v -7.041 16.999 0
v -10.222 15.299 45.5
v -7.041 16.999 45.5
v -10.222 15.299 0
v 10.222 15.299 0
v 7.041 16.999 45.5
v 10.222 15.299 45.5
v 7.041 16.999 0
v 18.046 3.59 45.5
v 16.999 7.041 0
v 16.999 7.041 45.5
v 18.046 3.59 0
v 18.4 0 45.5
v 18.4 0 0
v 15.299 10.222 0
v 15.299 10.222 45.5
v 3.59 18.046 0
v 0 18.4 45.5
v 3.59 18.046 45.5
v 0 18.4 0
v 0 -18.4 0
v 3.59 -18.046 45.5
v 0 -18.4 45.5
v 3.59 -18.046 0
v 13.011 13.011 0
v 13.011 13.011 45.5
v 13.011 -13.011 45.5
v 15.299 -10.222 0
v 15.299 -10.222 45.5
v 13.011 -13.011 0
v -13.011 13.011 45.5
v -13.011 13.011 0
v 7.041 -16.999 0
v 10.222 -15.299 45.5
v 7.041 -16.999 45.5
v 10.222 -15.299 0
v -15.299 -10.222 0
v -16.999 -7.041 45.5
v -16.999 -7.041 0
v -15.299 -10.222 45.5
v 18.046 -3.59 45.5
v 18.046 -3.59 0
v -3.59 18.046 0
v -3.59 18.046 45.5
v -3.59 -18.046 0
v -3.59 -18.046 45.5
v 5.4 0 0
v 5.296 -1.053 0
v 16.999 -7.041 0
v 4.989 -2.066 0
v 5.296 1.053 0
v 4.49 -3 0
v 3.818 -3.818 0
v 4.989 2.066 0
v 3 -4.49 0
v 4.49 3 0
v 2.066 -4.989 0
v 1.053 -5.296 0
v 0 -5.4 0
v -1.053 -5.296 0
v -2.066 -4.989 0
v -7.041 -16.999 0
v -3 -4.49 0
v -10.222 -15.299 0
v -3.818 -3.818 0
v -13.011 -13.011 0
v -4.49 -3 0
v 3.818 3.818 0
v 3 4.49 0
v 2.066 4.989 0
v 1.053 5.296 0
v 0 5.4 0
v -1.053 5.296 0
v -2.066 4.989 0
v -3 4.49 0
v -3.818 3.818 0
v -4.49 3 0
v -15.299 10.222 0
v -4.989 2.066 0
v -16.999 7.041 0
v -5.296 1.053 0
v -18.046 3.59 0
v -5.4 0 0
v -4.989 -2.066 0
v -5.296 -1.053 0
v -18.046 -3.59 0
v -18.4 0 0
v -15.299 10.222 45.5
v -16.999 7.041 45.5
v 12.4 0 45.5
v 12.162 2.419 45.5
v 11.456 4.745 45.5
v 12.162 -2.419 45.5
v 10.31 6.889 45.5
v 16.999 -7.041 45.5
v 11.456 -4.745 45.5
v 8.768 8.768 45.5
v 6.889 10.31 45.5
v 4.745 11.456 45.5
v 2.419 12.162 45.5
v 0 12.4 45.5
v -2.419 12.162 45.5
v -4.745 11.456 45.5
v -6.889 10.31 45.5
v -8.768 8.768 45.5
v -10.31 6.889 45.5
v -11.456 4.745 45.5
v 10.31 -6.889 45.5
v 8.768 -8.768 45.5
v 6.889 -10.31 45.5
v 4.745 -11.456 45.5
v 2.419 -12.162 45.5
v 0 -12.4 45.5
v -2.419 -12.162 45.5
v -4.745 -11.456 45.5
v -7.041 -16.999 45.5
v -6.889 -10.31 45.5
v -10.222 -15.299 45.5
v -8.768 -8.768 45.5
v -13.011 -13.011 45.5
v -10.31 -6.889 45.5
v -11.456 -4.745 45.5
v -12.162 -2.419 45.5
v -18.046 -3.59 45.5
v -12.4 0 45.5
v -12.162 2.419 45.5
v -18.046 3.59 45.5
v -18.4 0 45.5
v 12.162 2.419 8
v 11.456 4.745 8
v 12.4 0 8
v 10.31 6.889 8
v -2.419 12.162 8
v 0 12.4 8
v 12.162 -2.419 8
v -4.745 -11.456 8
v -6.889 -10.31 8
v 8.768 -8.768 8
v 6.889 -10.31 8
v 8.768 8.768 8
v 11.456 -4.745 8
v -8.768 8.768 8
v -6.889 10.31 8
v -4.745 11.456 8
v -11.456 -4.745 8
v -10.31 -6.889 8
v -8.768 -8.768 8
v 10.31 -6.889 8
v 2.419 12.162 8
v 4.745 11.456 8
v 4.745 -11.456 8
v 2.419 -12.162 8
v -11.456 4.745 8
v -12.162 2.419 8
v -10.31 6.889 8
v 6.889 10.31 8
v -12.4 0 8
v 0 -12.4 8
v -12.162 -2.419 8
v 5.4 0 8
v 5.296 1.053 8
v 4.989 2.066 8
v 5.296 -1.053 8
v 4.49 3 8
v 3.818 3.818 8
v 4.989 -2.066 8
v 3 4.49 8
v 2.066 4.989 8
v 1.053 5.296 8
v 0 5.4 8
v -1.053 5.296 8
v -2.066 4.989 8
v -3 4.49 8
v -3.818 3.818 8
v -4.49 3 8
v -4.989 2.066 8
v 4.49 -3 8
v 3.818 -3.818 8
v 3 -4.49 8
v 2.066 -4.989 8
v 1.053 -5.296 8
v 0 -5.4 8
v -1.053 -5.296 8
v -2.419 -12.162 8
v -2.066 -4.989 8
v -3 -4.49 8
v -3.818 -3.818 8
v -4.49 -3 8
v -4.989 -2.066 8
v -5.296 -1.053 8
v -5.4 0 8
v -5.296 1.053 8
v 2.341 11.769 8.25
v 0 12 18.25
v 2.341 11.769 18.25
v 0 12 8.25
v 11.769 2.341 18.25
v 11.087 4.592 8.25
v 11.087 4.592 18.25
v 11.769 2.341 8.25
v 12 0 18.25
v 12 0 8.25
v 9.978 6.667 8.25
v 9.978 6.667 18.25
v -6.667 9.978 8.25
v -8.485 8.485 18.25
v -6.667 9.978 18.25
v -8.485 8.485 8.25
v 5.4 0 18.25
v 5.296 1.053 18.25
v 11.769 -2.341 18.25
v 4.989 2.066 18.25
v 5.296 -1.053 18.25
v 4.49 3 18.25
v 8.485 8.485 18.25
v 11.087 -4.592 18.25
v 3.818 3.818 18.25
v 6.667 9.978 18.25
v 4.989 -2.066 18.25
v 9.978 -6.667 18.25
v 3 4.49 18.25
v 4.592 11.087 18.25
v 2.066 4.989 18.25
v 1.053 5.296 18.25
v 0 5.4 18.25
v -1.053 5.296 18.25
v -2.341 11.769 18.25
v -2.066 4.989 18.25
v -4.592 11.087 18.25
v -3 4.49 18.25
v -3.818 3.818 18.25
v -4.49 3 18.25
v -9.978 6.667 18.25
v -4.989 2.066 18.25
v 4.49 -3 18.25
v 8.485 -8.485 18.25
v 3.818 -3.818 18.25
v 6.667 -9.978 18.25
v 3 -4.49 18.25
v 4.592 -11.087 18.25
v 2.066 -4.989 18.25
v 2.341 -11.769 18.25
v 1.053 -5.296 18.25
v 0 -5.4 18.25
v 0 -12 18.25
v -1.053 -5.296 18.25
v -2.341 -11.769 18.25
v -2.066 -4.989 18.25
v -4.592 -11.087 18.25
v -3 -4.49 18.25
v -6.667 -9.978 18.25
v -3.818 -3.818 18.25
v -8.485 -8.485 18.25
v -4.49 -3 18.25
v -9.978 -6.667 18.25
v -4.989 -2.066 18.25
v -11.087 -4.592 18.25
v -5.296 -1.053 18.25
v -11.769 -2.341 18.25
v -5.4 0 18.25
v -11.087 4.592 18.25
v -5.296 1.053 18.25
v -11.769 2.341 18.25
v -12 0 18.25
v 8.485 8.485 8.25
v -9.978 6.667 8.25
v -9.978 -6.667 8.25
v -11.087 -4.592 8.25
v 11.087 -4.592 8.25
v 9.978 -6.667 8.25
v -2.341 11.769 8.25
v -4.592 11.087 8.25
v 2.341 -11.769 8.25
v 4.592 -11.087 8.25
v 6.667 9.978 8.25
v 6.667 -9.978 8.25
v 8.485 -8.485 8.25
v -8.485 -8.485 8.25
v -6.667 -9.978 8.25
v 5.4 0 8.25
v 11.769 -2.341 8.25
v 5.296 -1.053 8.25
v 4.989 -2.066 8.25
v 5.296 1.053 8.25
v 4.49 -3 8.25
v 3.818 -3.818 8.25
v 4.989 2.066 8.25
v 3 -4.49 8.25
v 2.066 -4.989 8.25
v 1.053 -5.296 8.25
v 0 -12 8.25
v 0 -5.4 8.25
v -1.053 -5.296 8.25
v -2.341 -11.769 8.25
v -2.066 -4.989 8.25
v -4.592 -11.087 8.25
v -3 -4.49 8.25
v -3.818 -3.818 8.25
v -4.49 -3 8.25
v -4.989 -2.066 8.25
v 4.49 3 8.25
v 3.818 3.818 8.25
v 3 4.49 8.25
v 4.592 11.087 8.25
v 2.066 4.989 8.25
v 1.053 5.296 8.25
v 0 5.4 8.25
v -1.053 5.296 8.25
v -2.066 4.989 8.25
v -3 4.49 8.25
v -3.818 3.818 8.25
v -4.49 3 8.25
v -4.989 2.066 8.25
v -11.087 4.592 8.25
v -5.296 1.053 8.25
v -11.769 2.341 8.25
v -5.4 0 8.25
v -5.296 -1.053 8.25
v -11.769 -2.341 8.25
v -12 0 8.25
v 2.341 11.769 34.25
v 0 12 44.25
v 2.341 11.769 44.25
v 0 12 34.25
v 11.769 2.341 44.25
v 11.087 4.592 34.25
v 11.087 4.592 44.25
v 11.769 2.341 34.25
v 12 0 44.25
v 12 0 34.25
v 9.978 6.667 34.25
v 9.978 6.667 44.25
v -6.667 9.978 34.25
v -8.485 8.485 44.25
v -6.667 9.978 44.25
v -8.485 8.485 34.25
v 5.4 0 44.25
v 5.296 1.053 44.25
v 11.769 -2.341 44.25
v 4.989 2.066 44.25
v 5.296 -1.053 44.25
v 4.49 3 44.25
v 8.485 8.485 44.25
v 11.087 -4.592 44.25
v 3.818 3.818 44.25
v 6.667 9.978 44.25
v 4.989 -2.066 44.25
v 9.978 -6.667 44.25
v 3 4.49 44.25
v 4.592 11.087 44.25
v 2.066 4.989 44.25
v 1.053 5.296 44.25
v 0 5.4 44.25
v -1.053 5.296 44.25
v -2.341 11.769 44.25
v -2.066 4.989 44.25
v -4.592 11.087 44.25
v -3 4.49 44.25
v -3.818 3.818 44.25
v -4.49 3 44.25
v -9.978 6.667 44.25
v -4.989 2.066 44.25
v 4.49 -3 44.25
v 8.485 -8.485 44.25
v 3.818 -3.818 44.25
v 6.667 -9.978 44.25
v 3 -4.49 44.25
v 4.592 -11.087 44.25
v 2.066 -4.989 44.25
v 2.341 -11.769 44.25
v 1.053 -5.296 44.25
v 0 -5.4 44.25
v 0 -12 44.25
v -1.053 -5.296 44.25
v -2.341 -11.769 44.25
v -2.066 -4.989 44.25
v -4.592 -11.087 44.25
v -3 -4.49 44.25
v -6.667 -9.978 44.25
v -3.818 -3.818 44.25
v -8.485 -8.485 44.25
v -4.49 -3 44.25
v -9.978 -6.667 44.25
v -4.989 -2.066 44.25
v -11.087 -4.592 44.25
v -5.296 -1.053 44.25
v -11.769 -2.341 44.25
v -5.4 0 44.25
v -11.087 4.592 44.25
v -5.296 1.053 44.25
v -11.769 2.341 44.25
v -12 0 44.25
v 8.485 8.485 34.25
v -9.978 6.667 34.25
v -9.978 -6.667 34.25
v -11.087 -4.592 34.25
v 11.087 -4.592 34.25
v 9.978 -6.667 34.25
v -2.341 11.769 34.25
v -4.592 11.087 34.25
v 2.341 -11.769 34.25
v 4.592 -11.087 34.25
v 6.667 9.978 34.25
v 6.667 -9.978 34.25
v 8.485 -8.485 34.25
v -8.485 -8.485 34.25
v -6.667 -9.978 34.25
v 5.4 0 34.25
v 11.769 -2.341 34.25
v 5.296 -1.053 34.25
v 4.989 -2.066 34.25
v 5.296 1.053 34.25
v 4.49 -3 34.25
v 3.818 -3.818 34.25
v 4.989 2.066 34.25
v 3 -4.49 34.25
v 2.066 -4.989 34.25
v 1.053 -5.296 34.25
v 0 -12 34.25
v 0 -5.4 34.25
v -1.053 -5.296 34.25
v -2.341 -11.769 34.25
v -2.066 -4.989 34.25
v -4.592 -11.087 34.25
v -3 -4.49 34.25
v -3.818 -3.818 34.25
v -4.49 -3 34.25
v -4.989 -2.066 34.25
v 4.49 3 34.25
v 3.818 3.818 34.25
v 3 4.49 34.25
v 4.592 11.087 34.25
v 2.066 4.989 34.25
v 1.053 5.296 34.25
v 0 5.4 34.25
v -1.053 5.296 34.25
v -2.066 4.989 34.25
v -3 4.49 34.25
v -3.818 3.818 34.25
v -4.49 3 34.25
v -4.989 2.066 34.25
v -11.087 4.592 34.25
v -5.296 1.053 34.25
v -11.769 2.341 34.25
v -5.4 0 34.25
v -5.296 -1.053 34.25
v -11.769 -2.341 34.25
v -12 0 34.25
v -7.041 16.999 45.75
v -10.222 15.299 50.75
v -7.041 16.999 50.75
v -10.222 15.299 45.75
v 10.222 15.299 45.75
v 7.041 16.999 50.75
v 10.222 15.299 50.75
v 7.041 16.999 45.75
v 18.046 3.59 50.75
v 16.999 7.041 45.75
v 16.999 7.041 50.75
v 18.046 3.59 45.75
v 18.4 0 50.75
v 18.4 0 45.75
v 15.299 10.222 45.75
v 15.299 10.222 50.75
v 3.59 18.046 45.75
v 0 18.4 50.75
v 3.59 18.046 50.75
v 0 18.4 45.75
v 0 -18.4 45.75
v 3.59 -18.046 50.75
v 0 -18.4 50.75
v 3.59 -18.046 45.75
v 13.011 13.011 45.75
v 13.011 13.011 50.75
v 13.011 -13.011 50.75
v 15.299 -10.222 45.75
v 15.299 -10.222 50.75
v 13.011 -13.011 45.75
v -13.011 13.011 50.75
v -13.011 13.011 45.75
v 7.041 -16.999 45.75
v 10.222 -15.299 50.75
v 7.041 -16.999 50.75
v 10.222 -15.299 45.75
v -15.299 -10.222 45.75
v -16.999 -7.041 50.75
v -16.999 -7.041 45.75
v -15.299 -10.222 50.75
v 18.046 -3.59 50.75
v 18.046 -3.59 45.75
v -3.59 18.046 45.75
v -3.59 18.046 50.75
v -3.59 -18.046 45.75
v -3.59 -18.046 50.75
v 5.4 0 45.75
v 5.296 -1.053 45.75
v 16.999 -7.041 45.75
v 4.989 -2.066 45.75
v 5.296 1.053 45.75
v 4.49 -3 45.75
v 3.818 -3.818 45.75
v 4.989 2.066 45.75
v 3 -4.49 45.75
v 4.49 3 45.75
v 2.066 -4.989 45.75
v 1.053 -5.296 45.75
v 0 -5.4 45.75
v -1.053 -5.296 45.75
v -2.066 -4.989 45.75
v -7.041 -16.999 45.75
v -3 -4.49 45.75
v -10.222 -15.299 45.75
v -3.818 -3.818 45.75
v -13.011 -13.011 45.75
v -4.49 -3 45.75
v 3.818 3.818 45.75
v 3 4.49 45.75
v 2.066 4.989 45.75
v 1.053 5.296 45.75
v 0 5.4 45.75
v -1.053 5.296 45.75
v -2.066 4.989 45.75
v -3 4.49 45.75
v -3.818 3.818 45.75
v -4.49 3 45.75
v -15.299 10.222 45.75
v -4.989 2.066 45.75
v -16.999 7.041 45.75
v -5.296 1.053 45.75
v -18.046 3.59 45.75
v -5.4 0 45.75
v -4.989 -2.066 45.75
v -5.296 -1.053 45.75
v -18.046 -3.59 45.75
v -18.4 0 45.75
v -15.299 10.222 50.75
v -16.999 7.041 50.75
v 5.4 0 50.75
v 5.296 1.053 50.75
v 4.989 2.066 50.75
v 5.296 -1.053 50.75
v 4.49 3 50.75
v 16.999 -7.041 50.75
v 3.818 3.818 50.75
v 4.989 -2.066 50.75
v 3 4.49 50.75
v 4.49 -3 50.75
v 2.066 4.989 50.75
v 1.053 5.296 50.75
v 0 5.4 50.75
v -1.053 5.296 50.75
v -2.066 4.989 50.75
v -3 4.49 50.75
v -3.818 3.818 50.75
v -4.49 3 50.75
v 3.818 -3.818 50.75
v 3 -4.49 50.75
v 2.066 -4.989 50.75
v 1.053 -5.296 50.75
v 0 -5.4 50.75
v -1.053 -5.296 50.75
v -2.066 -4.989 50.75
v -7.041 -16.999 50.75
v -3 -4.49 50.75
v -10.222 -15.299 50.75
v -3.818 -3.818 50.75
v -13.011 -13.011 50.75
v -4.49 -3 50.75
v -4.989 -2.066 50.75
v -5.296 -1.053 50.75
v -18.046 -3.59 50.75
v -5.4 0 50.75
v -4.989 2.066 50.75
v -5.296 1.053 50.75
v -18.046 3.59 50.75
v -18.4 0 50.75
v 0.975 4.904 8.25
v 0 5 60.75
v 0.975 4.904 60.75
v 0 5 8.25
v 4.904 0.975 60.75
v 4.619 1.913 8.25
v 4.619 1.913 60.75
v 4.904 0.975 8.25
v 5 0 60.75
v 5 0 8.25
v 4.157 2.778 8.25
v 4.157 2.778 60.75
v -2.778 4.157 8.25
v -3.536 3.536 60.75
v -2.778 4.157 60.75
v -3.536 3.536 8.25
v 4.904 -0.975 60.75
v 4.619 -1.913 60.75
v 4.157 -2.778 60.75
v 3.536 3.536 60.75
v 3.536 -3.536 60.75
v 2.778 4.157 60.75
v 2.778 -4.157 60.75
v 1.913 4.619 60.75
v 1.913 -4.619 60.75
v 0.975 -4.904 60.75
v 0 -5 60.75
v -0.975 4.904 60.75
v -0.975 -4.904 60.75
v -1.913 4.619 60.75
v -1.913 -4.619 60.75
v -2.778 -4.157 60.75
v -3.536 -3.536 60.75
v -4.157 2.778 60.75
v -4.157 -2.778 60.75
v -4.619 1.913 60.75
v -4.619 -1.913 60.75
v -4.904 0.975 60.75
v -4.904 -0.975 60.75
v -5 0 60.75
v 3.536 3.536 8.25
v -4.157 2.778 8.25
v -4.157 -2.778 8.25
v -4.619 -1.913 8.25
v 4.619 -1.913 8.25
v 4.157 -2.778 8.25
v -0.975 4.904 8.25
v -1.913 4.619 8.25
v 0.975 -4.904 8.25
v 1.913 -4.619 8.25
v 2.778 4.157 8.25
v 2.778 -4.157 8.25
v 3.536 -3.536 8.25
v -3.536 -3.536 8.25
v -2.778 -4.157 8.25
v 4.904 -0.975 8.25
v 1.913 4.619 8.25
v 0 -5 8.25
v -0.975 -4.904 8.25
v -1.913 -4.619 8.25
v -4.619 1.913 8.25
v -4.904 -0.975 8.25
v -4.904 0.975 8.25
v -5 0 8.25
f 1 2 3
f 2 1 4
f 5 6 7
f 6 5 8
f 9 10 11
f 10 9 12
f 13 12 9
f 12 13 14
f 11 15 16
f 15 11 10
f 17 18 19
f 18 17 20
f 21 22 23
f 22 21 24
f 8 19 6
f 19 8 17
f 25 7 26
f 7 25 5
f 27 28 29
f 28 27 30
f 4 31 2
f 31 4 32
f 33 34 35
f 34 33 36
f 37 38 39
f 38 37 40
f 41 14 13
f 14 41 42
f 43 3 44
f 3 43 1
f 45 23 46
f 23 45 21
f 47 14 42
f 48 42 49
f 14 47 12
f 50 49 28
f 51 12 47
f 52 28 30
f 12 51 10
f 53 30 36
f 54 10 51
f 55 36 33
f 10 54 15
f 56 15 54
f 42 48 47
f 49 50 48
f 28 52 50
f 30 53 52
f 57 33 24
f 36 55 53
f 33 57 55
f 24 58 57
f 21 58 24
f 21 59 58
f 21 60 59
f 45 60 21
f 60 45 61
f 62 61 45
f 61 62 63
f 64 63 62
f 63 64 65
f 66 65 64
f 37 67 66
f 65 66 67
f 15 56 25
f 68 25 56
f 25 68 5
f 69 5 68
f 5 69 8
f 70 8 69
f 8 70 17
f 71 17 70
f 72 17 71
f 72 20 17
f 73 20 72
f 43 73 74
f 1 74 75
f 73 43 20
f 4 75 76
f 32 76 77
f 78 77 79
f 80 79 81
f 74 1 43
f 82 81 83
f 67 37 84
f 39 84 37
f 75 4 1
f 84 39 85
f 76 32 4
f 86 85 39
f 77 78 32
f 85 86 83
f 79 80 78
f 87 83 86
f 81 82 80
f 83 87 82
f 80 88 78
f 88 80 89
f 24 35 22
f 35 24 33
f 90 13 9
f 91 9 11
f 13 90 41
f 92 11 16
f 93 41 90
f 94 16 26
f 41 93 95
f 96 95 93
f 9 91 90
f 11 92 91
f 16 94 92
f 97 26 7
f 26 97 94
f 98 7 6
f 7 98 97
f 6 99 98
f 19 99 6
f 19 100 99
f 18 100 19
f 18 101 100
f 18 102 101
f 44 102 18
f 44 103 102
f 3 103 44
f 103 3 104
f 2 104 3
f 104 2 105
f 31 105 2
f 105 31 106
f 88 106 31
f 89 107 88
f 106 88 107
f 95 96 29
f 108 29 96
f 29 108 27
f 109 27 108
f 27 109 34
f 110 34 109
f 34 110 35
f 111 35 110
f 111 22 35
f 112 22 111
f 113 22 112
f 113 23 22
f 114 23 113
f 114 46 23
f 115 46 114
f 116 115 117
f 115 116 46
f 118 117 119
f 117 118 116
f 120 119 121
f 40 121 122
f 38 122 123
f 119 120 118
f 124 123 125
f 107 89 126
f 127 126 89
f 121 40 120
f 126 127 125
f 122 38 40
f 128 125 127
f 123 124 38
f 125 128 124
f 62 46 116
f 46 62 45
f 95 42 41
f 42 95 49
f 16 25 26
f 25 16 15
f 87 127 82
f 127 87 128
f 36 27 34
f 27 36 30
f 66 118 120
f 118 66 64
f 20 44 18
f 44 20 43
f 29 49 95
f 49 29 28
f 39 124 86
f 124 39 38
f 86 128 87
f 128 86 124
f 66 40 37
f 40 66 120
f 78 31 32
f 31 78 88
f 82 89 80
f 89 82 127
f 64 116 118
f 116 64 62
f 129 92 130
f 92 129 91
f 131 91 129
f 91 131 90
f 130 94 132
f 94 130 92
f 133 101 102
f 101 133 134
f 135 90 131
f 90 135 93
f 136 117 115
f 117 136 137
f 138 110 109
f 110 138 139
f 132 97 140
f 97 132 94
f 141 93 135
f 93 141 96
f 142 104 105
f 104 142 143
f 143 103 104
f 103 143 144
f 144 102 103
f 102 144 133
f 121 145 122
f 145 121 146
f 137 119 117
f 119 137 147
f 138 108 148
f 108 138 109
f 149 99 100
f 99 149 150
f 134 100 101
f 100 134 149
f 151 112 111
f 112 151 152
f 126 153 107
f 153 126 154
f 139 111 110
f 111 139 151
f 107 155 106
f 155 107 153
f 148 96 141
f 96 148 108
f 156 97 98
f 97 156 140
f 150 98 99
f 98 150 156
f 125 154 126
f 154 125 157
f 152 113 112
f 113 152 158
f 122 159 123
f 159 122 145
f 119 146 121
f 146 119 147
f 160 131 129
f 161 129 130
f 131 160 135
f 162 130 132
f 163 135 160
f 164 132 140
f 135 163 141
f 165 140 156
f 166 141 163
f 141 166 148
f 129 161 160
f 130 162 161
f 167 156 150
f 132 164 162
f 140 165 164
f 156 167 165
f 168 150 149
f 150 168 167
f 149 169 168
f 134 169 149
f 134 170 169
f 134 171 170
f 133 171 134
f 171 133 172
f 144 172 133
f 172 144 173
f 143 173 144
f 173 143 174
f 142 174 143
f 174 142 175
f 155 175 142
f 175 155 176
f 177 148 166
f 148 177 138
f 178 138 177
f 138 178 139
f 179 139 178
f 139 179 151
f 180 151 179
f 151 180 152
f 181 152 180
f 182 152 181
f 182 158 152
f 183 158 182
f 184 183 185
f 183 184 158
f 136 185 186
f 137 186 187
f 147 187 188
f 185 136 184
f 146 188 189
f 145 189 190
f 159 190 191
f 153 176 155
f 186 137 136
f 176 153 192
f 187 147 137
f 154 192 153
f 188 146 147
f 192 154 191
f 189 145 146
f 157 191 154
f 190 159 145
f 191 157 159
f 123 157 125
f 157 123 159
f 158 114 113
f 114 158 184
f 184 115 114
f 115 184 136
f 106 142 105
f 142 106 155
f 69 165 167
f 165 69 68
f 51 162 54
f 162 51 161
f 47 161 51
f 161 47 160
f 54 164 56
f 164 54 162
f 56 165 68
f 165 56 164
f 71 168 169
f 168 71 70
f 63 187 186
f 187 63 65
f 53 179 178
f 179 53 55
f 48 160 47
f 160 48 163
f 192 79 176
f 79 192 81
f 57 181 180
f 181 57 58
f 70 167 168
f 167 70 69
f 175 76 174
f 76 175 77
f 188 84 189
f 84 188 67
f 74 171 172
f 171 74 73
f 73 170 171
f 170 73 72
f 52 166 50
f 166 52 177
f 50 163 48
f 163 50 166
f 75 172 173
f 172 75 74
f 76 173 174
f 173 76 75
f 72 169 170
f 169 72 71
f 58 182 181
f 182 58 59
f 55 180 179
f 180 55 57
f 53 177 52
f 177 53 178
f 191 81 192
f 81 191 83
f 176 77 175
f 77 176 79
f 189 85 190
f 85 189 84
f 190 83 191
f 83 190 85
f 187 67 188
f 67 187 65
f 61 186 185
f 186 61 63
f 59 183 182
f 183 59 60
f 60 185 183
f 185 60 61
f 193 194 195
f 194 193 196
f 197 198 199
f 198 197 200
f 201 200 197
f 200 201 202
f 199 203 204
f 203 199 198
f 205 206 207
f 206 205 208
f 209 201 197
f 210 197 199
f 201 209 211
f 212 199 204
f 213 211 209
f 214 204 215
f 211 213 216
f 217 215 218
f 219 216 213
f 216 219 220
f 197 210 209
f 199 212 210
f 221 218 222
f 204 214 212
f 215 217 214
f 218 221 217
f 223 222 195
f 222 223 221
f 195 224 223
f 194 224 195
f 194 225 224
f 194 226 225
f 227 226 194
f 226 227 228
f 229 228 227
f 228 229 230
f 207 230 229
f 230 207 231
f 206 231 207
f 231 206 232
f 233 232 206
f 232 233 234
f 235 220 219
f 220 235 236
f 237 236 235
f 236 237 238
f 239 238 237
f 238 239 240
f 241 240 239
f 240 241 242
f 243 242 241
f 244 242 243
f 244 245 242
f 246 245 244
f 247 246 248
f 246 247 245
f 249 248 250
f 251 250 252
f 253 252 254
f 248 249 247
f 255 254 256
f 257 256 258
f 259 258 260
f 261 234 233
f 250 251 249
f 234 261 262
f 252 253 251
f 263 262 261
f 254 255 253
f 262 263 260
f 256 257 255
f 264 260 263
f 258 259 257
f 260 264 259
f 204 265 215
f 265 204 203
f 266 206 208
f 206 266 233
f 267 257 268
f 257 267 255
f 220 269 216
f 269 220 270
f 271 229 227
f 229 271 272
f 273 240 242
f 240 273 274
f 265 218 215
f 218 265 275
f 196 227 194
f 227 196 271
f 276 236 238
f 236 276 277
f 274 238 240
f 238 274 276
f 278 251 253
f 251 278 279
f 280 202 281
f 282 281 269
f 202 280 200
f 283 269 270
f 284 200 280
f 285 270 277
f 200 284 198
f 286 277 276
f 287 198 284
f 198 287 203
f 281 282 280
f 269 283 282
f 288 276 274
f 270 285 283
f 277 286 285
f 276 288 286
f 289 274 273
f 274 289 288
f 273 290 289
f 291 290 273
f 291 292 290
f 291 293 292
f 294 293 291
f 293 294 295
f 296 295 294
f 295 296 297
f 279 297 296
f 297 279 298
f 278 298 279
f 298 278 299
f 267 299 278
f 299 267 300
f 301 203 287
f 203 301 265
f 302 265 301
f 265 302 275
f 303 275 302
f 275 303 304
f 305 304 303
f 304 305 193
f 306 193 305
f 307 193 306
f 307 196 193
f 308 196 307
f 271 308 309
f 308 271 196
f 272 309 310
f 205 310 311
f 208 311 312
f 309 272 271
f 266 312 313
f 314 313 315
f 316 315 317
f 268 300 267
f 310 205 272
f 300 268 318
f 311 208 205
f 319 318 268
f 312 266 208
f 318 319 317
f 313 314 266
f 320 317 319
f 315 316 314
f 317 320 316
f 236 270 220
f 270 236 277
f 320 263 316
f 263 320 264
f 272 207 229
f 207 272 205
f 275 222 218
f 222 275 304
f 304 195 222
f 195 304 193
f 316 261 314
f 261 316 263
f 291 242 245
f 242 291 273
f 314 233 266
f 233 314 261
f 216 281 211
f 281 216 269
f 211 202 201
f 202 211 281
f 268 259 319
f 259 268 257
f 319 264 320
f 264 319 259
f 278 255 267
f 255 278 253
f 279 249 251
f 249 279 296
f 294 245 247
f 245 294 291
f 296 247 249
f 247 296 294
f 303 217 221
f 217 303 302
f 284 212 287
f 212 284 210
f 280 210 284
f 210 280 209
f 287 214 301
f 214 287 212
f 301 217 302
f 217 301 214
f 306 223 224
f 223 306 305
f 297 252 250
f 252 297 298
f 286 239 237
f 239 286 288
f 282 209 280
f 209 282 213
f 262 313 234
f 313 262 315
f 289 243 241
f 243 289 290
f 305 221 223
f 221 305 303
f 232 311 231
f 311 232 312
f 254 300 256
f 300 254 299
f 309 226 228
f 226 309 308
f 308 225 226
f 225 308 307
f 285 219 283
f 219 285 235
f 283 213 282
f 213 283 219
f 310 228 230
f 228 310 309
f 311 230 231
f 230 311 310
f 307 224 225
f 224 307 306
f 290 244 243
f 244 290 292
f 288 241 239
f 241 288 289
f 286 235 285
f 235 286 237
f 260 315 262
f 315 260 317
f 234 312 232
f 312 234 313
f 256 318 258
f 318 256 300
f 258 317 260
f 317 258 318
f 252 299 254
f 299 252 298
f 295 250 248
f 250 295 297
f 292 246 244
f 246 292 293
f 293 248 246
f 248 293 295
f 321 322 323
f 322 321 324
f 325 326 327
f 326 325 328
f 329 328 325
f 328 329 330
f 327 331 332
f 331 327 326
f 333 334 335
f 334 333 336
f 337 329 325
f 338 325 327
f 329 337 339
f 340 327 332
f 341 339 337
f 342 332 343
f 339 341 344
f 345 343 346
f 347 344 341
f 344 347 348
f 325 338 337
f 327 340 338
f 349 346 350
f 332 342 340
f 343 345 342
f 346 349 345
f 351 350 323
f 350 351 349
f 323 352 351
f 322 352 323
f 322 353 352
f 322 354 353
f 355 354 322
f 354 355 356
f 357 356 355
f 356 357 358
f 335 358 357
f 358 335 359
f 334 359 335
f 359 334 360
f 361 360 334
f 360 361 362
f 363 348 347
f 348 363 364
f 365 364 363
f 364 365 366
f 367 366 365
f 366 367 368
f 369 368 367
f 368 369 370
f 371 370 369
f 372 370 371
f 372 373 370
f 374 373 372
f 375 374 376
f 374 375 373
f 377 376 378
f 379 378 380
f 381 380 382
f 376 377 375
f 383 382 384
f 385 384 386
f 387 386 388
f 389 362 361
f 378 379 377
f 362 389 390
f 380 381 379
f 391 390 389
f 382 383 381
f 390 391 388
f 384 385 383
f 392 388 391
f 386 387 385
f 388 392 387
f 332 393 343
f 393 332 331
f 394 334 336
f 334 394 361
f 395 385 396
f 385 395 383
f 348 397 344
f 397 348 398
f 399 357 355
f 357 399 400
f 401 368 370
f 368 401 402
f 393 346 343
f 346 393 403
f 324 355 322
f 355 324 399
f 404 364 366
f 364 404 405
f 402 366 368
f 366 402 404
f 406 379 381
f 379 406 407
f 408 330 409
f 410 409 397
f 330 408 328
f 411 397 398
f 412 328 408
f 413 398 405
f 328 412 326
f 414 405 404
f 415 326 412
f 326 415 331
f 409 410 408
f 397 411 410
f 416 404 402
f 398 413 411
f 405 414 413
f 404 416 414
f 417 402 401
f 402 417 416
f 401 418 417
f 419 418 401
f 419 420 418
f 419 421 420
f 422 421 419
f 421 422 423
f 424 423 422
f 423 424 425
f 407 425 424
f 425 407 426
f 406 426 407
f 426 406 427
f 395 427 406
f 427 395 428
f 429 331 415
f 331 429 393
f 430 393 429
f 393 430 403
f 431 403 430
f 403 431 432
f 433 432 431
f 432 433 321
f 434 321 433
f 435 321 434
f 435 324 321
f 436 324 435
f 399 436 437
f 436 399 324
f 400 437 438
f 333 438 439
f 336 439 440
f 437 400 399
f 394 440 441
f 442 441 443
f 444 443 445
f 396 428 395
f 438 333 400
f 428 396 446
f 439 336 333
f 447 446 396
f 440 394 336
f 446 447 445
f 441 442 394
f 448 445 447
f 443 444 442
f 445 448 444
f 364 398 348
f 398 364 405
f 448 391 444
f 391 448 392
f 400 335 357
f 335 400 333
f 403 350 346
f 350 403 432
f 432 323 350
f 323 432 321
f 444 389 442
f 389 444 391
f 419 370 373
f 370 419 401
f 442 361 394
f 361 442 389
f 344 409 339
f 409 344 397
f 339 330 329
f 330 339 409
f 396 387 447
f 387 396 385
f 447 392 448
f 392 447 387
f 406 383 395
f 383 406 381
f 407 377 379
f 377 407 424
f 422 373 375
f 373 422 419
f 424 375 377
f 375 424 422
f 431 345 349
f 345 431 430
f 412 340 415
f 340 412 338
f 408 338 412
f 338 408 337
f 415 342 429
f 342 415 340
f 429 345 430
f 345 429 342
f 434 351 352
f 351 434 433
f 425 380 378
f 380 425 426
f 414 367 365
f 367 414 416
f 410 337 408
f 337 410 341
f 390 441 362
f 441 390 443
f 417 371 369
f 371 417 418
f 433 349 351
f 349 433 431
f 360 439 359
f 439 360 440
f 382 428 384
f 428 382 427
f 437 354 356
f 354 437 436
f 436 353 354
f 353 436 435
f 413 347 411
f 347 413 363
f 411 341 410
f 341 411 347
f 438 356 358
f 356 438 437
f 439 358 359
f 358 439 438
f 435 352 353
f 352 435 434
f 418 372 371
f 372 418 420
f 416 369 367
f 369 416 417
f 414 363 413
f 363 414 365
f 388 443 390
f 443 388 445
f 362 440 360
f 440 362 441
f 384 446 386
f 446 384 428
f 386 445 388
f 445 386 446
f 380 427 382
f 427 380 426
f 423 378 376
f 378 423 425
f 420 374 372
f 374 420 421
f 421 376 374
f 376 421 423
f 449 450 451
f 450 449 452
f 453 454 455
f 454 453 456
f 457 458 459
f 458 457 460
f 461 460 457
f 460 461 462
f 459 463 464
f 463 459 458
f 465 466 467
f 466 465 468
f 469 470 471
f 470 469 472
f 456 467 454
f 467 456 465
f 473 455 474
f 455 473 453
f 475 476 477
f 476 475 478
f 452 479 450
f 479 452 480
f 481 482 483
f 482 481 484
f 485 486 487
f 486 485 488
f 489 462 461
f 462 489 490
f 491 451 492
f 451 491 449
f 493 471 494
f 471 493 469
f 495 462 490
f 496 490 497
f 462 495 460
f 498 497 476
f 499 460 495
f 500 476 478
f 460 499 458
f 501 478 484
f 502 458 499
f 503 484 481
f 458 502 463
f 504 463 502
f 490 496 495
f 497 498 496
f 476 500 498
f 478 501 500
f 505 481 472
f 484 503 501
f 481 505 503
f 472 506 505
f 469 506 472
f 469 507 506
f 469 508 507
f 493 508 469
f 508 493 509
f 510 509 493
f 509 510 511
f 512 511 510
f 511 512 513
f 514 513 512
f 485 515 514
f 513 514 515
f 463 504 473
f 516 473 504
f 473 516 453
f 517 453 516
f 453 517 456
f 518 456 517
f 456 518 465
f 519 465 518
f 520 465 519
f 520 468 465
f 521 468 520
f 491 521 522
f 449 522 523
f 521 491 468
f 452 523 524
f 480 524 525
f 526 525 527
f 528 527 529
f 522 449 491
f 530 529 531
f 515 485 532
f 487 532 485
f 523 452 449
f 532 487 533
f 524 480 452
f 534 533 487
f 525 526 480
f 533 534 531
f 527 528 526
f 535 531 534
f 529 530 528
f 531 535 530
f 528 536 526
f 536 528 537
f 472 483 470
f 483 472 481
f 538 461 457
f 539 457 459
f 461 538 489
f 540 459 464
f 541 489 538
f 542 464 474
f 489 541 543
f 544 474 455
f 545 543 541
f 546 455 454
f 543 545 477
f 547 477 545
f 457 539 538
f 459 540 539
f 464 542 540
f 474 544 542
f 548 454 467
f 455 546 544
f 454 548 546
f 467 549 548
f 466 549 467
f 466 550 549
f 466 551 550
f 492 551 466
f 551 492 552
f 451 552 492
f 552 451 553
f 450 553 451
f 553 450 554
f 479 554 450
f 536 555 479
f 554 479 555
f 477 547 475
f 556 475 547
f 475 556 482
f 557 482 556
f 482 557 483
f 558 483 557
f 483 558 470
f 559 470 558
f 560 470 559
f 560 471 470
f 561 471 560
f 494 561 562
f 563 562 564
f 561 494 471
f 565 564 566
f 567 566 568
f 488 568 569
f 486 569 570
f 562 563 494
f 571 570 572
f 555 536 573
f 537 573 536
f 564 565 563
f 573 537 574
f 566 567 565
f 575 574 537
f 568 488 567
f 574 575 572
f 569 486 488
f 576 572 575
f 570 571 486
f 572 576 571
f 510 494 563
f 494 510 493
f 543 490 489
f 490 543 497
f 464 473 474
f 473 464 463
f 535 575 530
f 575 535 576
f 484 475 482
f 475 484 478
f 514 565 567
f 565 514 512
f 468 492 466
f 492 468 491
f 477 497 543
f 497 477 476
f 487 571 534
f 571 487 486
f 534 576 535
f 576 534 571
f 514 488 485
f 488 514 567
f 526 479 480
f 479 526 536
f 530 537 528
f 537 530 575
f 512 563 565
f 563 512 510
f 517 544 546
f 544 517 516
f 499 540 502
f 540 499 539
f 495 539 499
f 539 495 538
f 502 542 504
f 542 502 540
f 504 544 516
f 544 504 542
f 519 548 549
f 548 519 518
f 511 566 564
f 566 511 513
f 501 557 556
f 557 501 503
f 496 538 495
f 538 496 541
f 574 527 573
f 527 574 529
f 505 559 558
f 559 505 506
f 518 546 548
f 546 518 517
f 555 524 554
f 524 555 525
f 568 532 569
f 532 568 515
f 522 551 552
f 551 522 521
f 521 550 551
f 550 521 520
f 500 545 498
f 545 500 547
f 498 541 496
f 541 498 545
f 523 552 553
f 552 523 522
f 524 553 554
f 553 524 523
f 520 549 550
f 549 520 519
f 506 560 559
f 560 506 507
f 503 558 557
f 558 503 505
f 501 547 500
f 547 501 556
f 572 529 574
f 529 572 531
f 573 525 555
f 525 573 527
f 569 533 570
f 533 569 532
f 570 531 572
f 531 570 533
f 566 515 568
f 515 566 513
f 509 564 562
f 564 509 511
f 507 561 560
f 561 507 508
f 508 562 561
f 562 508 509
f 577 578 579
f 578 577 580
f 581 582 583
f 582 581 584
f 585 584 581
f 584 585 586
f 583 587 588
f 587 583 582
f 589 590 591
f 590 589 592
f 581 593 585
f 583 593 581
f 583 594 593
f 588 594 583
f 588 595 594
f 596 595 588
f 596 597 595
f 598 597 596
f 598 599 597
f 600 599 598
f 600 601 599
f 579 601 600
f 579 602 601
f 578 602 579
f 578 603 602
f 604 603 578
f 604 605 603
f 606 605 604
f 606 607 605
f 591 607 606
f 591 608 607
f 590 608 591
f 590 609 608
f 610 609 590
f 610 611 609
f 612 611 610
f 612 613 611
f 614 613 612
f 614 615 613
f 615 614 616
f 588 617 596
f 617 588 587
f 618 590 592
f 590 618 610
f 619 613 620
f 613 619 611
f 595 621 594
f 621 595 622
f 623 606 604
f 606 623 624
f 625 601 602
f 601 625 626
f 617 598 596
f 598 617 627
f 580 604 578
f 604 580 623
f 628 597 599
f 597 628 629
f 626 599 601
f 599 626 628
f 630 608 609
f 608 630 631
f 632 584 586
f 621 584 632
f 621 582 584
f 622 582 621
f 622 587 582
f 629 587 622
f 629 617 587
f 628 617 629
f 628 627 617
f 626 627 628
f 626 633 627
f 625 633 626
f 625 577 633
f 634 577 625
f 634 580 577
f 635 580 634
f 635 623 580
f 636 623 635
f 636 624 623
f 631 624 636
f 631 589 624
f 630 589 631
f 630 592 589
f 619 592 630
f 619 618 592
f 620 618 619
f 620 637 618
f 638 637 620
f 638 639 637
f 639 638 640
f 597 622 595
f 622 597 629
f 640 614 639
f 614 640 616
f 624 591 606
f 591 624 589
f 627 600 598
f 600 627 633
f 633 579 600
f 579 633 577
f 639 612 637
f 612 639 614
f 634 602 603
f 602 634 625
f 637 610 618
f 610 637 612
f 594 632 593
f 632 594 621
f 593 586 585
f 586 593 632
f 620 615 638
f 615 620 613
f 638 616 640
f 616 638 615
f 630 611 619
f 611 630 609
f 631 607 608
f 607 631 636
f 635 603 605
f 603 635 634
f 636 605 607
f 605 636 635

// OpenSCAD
$fn = 32;

// ------------------------------------------------------------------------
// Shaft station: cup d36.8 x 45.5 mm, shaft d10
// Every part is its own module, assembly() places every instance.
// ------------------------------------------------------------------------

// --- part 1 ---
module housing_cup() {
  difference() {
    cylinder(h = 45.5, d = 36.8);
    translate([0, 0, 8]) cylinder(h = 38.5, d = 24.8);
    translate([0, 0, -1]) cylinder(h = 10, d = 10.8);
  }
}

// --- part 2 ---
module bearing_lower() {
  difference() {
      translate([0, 0, 0]) cylinder(h = 10, d = 24);
      translate([0, 0, -1]) cylinder(h = 12, d = 10.8);
    }
}

// --- part 3 ---
module bearing_upper() {
  difference() {
      translate([0, 0, 0]) cylinder(h = 10, d = 24);
      translate([0, 0, -1]) cylinder(h = 12, d = 10.8);
    }
}

// --- part 4 ---
module station_shaft() {
  translate([0, 0, -26.25]) cylinder(h = 52.5, d = 10);
}

// --- part 5 ---
module station_cover() {
  difference() {
    cylinder(h = 5, d = 36.8);
    translate([0, 0, -1]) cylinder(h = 7, d = 10.8);
  }
}

// --- assembly ---
module assembly() {
  color([0.80, 0.24, 0.20]) translate([0, 0, 0]) rotate([0, 0, 0]) housing_cup();
  color([0.20, 0.45, 0.75]) translate([0, 0, 8.25]) rotate([0, 0, 0]) bearing_lower();
  color([0.25, 0.62, 0.32]) translate([0, 0, 34.25]) rotate([0, 0, 0]) bearing_upper();
  color([0.92, 0.70, 0.18]) translate([0, 0, 34.5]) rotate([0, 0, 0]) station_shaft();
  color([0.58, 0.35, 0.70]) translate([0, 0, 45.75]) rotate([0, 0, 0]) station_cover();
}

assembly();
